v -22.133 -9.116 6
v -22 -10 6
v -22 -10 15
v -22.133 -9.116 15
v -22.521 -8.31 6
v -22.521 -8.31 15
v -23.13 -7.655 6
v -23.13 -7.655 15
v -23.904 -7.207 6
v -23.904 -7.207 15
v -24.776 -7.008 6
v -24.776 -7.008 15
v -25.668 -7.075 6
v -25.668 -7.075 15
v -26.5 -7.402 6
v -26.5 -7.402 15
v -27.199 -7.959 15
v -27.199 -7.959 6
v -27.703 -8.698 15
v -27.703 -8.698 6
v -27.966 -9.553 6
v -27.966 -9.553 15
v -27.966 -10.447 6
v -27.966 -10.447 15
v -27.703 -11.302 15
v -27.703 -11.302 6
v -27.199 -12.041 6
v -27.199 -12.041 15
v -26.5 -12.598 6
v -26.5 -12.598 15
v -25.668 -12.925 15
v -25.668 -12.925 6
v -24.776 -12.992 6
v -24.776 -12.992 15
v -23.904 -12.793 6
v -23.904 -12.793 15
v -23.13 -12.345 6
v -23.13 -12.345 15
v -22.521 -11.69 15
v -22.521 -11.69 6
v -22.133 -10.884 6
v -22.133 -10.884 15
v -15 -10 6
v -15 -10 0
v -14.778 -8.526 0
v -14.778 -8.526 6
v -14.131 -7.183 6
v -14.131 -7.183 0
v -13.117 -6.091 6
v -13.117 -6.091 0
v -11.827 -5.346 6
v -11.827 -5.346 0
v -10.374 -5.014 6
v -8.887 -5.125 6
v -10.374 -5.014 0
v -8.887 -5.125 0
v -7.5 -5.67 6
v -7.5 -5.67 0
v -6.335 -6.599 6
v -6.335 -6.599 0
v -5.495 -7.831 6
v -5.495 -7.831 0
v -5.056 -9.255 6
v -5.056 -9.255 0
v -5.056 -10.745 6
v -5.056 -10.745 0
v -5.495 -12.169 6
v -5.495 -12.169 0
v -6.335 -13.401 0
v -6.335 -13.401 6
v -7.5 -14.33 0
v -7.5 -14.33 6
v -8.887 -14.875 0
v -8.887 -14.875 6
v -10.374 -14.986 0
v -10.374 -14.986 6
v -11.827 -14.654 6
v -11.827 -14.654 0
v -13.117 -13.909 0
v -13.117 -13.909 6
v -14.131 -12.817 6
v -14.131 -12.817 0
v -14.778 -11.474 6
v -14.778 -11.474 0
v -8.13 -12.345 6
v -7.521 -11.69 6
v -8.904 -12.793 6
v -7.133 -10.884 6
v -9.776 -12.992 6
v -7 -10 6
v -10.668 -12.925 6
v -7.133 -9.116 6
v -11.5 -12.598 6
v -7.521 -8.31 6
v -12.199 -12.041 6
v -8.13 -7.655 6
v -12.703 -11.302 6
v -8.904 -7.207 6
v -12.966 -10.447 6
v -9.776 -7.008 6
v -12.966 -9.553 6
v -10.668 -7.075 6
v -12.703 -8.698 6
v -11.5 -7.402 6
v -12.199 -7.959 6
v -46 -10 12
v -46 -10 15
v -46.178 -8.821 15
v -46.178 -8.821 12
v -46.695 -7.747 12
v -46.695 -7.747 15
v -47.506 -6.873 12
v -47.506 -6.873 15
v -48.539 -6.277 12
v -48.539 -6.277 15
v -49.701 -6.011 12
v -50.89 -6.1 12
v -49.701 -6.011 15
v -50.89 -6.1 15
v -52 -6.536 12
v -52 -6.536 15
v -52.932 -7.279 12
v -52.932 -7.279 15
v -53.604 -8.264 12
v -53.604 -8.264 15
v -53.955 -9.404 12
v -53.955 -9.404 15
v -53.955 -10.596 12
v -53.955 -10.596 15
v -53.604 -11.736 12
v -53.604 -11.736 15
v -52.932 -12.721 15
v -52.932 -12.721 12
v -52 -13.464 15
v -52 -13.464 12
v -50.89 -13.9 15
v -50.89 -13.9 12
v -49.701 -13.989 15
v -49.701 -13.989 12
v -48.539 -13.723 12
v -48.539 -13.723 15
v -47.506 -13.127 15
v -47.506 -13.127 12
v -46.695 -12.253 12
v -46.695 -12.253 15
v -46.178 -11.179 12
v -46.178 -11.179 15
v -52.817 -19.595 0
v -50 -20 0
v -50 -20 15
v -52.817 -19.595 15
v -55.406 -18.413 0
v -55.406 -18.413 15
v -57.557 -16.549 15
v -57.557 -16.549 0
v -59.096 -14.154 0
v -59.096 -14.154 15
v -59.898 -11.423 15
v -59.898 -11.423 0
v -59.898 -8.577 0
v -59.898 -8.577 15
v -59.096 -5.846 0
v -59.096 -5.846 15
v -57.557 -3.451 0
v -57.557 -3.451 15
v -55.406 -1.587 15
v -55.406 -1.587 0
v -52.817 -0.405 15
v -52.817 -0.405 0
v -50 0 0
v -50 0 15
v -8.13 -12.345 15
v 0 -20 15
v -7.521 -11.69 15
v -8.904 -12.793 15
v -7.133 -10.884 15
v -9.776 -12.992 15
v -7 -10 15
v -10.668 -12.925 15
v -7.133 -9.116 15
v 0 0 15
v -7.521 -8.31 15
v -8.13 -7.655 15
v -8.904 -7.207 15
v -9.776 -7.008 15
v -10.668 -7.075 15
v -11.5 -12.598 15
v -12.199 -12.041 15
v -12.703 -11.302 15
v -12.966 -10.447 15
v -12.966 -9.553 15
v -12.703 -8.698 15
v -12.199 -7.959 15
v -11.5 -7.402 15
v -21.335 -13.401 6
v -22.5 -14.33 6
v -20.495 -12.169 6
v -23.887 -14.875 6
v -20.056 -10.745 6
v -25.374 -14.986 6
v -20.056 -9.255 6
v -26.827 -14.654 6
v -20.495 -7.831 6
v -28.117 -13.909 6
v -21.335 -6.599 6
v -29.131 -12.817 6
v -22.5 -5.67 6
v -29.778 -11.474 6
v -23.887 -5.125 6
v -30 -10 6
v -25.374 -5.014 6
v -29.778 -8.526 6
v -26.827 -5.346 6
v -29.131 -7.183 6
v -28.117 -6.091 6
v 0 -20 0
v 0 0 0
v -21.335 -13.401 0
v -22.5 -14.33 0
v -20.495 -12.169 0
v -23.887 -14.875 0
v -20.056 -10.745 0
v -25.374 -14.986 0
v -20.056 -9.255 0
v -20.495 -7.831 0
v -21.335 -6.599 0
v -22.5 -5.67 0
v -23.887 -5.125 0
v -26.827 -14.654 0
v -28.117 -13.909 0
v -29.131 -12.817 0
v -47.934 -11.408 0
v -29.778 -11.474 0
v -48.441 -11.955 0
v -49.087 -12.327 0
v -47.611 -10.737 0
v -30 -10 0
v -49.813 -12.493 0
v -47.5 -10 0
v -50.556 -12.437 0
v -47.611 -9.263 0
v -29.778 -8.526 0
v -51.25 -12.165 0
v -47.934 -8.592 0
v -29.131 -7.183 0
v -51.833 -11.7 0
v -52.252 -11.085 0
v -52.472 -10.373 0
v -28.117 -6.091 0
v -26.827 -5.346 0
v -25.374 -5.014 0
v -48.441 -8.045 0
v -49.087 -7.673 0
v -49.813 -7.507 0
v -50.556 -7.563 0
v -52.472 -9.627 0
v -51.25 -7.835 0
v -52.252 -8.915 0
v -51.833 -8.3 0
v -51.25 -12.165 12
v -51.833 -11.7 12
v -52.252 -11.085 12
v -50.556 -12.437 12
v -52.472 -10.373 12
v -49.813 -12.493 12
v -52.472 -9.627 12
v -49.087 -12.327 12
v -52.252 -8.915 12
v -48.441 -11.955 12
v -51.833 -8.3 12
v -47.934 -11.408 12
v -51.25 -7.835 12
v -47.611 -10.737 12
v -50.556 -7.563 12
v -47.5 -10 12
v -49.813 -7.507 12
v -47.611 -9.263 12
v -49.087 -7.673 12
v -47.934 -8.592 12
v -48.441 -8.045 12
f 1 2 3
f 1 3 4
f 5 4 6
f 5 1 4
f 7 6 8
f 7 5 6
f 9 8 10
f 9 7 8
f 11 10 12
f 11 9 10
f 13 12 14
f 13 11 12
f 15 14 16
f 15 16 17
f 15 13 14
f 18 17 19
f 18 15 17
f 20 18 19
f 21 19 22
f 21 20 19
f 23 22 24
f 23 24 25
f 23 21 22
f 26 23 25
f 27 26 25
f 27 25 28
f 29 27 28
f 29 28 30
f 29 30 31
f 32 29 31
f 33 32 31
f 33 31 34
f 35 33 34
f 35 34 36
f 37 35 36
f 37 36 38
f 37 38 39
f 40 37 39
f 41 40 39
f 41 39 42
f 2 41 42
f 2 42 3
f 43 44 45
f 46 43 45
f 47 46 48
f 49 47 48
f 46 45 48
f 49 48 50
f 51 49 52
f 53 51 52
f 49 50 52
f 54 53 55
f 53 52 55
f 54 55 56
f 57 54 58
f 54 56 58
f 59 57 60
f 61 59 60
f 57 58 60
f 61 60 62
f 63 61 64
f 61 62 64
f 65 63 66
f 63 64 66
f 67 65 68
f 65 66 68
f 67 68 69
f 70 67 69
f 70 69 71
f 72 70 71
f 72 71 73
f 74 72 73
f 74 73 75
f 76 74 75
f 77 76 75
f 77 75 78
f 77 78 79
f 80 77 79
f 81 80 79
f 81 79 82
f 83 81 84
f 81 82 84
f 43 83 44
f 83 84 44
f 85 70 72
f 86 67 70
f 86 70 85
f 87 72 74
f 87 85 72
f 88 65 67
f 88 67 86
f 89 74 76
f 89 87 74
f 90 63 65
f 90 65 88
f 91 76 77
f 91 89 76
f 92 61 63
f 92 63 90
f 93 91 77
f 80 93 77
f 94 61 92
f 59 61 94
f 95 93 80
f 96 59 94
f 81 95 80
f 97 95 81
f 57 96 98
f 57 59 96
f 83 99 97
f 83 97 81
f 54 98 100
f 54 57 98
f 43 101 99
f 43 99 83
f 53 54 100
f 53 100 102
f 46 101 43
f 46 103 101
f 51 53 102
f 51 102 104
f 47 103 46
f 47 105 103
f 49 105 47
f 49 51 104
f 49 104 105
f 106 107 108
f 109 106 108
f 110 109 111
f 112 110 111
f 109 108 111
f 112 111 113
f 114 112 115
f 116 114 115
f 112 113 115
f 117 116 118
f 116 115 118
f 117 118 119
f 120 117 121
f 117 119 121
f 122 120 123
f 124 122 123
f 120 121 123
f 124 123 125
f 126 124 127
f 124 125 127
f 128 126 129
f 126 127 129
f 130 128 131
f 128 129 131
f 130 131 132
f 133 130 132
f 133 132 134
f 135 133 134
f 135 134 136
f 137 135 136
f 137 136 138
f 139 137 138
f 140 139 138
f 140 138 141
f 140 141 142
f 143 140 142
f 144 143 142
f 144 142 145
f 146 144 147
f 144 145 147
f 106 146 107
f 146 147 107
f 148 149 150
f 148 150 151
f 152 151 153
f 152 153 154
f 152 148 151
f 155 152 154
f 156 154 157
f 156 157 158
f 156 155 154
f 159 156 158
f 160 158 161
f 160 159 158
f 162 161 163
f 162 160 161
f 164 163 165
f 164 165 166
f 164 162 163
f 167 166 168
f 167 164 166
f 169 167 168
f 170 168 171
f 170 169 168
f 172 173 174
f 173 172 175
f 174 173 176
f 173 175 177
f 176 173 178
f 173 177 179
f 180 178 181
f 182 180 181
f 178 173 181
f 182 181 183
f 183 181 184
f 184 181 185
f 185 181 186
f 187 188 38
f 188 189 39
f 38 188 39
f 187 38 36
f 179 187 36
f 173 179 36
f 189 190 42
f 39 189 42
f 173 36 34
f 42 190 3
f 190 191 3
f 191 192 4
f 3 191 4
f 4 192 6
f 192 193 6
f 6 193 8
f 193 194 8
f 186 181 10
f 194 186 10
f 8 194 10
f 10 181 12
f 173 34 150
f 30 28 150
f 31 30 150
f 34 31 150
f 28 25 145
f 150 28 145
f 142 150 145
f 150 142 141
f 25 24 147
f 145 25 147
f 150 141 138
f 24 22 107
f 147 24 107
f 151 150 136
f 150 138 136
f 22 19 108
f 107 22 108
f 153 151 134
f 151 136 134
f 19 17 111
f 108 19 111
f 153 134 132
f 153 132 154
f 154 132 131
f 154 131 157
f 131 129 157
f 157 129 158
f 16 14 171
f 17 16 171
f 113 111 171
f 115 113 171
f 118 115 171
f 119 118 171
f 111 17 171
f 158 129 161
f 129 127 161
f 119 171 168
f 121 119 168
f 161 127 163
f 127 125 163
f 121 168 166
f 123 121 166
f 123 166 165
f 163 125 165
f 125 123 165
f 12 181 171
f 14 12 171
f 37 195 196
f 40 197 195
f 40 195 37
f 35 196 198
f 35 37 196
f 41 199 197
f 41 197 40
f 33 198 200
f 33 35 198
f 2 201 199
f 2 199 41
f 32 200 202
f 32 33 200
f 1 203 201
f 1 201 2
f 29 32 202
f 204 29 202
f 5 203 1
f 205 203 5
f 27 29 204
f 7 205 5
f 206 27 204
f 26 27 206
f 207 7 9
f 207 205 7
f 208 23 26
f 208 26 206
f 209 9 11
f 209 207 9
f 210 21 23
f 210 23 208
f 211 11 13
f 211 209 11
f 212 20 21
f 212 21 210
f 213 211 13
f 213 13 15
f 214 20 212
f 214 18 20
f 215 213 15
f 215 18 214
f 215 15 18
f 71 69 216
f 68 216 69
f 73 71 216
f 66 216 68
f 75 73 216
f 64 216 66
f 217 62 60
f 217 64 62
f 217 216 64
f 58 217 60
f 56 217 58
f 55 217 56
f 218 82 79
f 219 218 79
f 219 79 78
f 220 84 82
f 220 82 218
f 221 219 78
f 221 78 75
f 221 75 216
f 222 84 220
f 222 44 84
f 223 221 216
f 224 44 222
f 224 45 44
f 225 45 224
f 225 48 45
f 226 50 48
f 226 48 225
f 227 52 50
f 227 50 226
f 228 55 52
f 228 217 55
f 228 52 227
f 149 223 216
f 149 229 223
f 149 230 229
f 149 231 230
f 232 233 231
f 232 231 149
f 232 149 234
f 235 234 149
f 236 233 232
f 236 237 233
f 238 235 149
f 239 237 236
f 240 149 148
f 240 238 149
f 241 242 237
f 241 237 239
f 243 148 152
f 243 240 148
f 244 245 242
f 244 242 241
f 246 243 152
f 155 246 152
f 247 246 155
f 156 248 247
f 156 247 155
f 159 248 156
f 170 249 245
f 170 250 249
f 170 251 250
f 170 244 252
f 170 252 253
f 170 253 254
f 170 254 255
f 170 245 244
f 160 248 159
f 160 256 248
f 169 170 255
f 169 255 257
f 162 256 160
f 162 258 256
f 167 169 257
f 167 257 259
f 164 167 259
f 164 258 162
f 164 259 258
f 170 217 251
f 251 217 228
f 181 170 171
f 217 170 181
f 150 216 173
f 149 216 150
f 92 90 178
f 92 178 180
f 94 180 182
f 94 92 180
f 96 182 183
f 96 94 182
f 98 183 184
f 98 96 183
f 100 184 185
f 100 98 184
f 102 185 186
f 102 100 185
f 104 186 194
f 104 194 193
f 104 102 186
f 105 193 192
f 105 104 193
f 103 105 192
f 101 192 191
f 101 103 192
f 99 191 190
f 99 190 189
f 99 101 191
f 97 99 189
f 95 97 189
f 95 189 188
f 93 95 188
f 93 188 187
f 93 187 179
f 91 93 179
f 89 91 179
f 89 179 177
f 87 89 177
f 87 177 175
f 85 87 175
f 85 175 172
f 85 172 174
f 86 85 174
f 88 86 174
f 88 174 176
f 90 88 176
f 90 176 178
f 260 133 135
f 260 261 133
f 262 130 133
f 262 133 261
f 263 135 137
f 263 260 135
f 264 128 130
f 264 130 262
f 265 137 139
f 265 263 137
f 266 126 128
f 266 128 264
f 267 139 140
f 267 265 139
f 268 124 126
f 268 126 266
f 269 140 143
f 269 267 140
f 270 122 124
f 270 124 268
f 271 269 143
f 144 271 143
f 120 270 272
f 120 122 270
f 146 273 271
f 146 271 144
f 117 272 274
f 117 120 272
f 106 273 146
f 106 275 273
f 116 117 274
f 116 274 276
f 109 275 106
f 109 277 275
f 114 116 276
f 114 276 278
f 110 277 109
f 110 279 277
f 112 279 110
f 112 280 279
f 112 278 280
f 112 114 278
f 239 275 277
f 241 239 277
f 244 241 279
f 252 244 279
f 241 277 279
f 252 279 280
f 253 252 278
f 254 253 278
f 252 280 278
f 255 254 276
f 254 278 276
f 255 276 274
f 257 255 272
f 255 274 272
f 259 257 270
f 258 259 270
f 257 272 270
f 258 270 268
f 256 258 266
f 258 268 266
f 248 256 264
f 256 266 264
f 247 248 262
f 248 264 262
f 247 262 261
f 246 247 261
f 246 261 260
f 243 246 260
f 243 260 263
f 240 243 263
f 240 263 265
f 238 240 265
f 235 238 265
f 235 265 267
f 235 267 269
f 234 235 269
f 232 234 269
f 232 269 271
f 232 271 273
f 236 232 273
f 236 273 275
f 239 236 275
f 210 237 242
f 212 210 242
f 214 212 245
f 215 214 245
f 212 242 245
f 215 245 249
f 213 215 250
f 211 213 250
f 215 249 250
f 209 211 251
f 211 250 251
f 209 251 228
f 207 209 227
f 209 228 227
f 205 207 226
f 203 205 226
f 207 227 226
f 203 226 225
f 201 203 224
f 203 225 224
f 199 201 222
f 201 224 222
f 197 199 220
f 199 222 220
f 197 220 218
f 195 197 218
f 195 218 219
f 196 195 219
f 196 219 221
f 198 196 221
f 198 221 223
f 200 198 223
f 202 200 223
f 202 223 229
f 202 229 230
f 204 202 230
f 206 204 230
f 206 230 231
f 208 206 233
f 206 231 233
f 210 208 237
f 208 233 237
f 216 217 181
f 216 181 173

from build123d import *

# Parameters (mm, degrees)
SKETCH_1_R          = 3
EXTRUDE_1_DEPTH     = 15
SKETCH_2_R          = 4
CUT_EXTRUDE_1_DEPTH = 3
SKETCH_3_R          = 2.5
CUT_EXTRUDE_2_DEPTH = 15
SKETCH_4_R          = 5
CUT_EXTRUDE_3_DEPTH = 6


with BuildPart() as part:
    # 草图1 → 凸台-拉伸1 (new body)
    with BuildSketch(Plane.XY):
        with BuildLine():
            Line((-50, 0), (0, 0))
            Line((0, 0), (0, -20))
            Line((0, -20), (-50, -20))
            ThreePointArc((-50, -20), (-60, -10), (-50, 0))
        make_face()
        with Locations((-25, -10)):
            Circle(SKETCH_1_R, mode=Mode.SUBTRACT)
        with Locations((-10, -10)):
            Circle(SKETCH_1_R, mode=Mode.SUBTRACT)
    extrude(amount=EXTRUDE_1_DEPTH)

    # 草图2 → 切除-拉伸1 (cut)
    with BuildSketch(Plane.XY.offset(15)):
        with Locations((-50, -10)):
            Circle(SKETCH_2_R)
    extrude(amount=-CUT_EXTRUDE_1_DEPTH, mode=Mode.SUBTRACT)

    # 草图3 → 切除-拉伸2 (cut)
    with BuildSketch(Plane.XY.offset(12)):
        with Locations((-50, -10)):
            Circle(SKETCH_3_R)
    extrude(amount=-CUT_EXTRUDE_2_DEPTH, mode=Mode.SUBTRACT)

    # 草图4 → 切除-拉伸3 (cut)
    with BuildSketch(Plane(origin=(0, 0, 0), x_dir=(-1, 0, 0), z_dir=(0, 0, -1))):
        with Locations((10, -10)):
            Circle(SKETCH_4_R)
        with Locations((25, -10)):
            Circle(SKETCH_4_R)
    extrude(amount=-CUT_EXTRUDE_3_DEPTH, mode=Mode.SUBTRACT)


solid = part.part
